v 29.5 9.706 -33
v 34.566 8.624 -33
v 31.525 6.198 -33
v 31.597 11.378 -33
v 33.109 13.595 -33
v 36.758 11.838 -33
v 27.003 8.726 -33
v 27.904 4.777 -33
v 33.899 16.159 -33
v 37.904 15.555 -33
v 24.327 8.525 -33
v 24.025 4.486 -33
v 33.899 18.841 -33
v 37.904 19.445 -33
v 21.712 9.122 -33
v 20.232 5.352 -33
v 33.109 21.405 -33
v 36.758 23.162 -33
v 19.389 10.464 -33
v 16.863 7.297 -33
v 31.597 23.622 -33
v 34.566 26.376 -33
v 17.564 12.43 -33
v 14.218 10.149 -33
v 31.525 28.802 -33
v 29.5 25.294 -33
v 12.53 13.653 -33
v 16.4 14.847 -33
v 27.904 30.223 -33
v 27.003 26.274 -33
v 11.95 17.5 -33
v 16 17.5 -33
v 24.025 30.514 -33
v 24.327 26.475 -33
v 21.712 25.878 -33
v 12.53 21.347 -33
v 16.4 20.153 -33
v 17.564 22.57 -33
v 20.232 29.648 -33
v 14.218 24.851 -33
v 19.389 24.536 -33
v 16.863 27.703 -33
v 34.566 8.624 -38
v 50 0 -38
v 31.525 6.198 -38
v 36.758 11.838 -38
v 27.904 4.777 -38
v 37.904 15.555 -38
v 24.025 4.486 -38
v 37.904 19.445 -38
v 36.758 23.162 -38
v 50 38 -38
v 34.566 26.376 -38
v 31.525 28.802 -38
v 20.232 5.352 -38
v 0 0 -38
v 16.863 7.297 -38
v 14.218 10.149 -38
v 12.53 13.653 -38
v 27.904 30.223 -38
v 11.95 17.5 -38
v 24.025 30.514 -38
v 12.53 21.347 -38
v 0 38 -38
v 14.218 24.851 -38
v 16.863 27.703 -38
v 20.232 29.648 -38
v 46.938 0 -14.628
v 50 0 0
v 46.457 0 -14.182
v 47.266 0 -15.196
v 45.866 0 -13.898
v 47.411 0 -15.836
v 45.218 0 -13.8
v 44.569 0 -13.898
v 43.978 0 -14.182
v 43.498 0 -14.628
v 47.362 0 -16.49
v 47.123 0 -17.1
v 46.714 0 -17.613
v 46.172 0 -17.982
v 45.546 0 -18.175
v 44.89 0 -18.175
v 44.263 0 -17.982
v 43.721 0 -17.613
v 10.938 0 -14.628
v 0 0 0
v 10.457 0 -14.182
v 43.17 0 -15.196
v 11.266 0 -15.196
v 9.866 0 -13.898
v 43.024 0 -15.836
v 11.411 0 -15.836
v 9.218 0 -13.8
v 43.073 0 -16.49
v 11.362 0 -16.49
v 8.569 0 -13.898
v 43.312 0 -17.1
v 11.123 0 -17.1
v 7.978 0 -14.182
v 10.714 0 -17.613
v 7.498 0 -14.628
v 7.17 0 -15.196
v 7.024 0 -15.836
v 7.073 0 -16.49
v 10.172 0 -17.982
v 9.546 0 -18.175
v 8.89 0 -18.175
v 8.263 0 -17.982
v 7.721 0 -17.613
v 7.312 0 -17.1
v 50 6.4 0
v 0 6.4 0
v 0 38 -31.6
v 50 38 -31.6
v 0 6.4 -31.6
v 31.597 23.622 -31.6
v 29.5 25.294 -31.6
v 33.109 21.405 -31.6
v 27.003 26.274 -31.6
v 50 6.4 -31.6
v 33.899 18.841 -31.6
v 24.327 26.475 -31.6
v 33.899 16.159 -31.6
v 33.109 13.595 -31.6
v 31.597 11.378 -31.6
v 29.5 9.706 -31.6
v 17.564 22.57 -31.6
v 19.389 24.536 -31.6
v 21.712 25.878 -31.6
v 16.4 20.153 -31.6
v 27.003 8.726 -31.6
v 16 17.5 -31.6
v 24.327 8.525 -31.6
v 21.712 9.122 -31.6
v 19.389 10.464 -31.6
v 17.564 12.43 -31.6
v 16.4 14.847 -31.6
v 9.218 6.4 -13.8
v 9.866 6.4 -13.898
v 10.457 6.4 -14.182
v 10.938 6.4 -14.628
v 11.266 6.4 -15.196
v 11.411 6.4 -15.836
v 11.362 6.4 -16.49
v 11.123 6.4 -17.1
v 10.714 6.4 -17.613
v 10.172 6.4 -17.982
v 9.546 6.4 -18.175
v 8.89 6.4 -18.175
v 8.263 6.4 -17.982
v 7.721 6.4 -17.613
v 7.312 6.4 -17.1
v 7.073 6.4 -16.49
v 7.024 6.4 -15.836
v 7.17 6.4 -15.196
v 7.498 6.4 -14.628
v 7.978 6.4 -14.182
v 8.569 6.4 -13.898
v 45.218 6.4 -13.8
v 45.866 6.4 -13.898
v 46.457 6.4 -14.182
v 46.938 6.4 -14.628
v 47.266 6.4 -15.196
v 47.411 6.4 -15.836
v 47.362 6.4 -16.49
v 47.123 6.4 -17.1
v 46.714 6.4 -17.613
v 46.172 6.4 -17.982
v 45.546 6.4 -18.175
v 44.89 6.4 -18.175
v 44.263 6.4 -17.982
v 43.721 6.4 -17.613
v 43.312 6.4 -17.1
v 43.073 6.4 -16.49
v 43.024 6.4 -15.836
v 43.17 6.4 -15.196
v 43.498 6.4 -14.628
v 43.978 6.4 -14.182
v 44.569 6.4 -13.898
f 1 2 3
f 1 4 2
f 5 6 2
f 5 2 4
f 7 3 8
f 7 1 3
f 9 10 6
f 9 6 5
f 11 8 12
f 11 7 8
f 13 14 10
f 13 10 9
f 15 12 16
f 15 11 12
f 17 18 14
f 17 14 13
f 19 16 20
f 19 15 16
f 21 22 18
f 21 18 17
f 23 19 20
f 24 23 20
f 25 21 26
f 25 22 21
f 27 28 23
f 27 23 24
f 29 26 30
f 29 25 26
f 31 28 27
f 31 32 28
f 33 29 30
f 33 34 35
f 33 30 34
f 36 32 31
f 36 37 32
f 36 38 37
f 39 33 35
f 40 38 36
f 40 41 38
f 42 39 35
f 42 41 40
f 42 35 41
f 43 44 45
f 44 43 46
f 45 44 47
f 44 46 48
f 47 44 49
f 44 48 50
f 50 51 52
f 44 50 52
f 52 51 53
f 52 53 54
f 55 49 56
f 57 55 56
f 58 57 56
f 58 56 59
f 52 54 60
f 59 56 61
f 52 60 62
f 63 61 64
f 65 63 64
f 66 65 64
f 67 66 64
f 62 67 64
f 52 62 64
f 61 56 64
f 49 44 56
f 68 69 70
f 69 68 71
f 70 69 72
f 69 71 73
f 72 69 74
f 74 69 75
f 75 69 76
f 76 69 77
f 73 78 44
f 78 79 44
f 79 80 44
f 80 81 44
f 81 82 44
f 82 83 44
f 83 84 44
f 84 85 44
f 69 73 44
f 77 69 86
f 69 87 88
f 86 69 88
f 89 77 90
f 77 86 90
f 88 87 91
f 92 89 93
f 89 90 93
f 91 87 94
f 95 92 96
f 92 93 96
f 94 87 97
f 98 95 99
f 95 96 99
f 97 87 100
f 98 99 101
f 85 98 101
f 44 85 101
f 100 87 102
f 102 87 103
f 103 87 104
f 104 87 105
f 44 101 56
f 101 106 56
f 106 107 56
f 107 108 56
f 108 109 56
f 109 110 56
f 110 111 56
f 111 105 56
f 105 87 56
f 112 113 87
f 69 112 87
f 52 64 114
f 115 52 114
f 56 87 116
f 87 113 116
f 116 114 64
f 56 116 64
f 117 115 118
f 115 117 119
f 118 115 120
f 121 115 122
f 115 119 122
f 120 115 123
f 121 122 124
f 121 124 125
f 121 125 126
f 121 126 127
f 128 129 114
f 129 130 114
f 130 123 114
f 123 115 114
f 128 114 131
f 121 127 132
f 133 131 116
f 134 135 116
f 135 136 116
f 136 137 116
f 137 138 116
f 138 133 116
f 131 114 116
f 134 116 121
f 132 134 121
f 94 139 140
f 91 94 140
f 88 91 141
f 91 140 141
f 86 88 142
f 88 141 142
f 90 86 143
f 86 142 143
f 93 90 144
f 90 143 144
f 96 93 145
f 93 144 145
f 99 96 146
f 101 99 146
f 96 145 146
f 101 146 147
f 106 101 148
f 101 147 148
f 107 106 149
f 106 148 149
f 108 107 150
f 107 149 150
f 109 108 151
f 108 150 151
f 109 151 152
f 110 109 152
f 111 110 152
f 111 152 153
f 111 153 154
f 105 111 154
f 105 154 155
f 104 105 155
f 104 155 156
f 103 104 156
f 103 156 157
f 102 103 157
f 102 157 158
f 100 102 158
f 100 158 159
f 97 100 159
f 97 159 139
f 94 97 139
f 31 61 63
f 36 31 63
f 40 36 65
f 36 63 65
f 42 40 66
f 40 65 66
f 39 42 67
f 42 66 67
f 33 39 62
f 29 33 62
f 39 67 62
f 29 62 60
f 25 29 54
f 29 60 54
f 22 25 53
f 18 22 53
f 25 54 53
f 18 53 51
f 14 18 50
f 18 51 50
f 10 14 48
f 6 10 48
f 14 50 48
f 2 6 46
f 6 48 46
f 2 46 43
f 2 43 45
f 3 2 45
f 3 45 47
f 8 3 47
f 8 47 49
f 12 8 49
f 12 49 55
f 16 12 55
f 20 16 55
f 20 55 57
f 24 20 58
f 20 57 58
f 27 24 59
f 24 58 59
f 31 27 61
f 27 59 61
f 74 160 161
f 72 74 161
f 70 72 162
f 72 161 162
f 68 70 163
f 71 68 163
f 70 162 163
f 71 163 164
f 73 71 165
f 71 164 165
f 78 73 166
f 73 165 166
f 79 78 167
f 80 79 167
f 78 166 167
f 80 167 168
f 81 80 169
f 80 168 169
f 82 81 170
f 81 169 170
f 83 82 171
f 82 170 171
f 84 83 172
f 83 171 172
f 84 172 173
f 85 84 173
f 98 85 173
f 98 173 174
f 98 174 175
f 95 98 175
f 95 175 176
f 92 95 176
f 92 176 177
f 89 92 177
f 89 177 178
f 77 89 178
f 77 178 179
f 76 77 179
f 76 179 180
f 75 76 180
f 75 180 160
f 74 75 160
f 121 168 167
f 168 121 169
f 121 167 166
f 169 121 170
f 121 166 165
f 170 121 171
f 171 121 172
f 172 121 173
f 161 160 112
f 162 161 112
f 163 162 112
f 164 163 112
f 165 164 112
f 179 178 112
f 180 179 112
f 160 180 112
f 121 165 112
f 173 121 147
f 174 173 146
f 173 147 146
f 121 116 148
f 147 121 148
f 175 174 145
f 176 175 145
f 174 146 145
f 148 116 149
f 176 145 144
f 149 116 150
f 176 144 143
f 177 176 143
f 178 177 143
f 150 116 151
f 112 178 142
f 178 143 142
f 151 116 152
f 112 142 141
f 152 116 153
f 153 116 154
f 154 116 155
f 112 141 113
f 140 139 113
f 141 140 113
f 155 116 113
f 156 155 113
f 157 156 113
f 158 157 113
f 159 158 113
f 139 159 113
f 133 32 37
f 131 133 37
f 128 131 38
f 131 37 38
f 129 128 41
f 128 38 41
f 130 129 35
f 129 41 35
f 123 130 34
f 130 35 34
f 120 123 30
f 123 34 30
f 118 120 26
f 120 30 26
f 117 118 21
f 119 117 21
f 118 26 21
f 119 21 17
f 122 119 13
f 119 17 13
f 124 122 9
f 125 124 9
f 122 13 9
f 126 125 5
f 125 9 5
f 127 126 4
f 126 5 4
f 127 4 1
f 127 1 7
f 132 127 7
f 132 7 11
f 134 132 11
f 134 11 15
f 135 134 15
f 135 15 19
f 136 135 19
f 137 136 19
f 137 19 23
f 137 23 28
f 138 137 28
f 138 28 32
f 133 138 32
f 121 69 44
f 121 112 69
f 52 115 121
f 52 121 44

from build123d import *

# Parameters (mm, degrees)
BOSS_EXTRUDE1_DEPTH = 50
SKETCH3_R           = 9
CUT_EXTRUDE1_DEPTH  = 50
SKETCH4_R           = 13.05
CUT_EXTRUDE2_DEPTH  = 5
SKETCH6_R           = 2.2
CUT_EXTRUDE3_DEPTH  = 8


with BuildPart() as part:
    # Sketch1 → Boss-Extrude1 (new body)
    with BuildSketch(Plane(origin=(0, 0, 0), x_dir=(0, 0, -1), z_dir=(1, 0, 0))):
        Polygon((0, 0), (38, 0), (38, 38), (31.6, 38), (31.6, 6.4), (0, 6.4), align=None)
    extrude(amount=BOSS_EXTRUDE1_DEPTH)

    # Sketch3 → Cut-Extrude1 (cut)
    with BuildSketch(Plane(origin=(0, 0, -38), x_dir=(-1, 0, 0), z_dir=(0, 0, -1))):
        with Locations((-25, 17.5)):
            Circle(SKETCH3_R)
    extrude(amount=-CUT_EXTRUDE1_DEPTH, mode=Mode.SUBTRACT)

    # Sketch4 → Cut-Extrude2 (cut)
    with BuildSketch(Plane(origin=(0, 0, -38), x_dir=(-1, 0, 0), z_dir=(0, 0, -1))):
        with Locations((-25, 17.5)):
            Circle(SKETCH4_R)
    extrude(amount=-CUT_EXTRUDE2_DEPTH, mode=Mode.SUBTRACT)

    # Sketch6 → Cut-Extrude3 (cut)
    with BuildSketch(Plane(origin=(0, 6.4, 0), x_dir=(1, 0, 0), z_dir=(0, 1, 0))):
        with Locations(Location((9.217627347, 16, 0), (0, 0, 270))):
            Circle(SKETCH6_R)
        with Locations(Location((45.217627347, 16, 0), (0, 0, 270))):
            Circle(SKETCH6_R)
    extrude(amount=-CUT_EXTRUDE3_DEPTH, mode=Mode.SUBTRACT)


solid = part.part
